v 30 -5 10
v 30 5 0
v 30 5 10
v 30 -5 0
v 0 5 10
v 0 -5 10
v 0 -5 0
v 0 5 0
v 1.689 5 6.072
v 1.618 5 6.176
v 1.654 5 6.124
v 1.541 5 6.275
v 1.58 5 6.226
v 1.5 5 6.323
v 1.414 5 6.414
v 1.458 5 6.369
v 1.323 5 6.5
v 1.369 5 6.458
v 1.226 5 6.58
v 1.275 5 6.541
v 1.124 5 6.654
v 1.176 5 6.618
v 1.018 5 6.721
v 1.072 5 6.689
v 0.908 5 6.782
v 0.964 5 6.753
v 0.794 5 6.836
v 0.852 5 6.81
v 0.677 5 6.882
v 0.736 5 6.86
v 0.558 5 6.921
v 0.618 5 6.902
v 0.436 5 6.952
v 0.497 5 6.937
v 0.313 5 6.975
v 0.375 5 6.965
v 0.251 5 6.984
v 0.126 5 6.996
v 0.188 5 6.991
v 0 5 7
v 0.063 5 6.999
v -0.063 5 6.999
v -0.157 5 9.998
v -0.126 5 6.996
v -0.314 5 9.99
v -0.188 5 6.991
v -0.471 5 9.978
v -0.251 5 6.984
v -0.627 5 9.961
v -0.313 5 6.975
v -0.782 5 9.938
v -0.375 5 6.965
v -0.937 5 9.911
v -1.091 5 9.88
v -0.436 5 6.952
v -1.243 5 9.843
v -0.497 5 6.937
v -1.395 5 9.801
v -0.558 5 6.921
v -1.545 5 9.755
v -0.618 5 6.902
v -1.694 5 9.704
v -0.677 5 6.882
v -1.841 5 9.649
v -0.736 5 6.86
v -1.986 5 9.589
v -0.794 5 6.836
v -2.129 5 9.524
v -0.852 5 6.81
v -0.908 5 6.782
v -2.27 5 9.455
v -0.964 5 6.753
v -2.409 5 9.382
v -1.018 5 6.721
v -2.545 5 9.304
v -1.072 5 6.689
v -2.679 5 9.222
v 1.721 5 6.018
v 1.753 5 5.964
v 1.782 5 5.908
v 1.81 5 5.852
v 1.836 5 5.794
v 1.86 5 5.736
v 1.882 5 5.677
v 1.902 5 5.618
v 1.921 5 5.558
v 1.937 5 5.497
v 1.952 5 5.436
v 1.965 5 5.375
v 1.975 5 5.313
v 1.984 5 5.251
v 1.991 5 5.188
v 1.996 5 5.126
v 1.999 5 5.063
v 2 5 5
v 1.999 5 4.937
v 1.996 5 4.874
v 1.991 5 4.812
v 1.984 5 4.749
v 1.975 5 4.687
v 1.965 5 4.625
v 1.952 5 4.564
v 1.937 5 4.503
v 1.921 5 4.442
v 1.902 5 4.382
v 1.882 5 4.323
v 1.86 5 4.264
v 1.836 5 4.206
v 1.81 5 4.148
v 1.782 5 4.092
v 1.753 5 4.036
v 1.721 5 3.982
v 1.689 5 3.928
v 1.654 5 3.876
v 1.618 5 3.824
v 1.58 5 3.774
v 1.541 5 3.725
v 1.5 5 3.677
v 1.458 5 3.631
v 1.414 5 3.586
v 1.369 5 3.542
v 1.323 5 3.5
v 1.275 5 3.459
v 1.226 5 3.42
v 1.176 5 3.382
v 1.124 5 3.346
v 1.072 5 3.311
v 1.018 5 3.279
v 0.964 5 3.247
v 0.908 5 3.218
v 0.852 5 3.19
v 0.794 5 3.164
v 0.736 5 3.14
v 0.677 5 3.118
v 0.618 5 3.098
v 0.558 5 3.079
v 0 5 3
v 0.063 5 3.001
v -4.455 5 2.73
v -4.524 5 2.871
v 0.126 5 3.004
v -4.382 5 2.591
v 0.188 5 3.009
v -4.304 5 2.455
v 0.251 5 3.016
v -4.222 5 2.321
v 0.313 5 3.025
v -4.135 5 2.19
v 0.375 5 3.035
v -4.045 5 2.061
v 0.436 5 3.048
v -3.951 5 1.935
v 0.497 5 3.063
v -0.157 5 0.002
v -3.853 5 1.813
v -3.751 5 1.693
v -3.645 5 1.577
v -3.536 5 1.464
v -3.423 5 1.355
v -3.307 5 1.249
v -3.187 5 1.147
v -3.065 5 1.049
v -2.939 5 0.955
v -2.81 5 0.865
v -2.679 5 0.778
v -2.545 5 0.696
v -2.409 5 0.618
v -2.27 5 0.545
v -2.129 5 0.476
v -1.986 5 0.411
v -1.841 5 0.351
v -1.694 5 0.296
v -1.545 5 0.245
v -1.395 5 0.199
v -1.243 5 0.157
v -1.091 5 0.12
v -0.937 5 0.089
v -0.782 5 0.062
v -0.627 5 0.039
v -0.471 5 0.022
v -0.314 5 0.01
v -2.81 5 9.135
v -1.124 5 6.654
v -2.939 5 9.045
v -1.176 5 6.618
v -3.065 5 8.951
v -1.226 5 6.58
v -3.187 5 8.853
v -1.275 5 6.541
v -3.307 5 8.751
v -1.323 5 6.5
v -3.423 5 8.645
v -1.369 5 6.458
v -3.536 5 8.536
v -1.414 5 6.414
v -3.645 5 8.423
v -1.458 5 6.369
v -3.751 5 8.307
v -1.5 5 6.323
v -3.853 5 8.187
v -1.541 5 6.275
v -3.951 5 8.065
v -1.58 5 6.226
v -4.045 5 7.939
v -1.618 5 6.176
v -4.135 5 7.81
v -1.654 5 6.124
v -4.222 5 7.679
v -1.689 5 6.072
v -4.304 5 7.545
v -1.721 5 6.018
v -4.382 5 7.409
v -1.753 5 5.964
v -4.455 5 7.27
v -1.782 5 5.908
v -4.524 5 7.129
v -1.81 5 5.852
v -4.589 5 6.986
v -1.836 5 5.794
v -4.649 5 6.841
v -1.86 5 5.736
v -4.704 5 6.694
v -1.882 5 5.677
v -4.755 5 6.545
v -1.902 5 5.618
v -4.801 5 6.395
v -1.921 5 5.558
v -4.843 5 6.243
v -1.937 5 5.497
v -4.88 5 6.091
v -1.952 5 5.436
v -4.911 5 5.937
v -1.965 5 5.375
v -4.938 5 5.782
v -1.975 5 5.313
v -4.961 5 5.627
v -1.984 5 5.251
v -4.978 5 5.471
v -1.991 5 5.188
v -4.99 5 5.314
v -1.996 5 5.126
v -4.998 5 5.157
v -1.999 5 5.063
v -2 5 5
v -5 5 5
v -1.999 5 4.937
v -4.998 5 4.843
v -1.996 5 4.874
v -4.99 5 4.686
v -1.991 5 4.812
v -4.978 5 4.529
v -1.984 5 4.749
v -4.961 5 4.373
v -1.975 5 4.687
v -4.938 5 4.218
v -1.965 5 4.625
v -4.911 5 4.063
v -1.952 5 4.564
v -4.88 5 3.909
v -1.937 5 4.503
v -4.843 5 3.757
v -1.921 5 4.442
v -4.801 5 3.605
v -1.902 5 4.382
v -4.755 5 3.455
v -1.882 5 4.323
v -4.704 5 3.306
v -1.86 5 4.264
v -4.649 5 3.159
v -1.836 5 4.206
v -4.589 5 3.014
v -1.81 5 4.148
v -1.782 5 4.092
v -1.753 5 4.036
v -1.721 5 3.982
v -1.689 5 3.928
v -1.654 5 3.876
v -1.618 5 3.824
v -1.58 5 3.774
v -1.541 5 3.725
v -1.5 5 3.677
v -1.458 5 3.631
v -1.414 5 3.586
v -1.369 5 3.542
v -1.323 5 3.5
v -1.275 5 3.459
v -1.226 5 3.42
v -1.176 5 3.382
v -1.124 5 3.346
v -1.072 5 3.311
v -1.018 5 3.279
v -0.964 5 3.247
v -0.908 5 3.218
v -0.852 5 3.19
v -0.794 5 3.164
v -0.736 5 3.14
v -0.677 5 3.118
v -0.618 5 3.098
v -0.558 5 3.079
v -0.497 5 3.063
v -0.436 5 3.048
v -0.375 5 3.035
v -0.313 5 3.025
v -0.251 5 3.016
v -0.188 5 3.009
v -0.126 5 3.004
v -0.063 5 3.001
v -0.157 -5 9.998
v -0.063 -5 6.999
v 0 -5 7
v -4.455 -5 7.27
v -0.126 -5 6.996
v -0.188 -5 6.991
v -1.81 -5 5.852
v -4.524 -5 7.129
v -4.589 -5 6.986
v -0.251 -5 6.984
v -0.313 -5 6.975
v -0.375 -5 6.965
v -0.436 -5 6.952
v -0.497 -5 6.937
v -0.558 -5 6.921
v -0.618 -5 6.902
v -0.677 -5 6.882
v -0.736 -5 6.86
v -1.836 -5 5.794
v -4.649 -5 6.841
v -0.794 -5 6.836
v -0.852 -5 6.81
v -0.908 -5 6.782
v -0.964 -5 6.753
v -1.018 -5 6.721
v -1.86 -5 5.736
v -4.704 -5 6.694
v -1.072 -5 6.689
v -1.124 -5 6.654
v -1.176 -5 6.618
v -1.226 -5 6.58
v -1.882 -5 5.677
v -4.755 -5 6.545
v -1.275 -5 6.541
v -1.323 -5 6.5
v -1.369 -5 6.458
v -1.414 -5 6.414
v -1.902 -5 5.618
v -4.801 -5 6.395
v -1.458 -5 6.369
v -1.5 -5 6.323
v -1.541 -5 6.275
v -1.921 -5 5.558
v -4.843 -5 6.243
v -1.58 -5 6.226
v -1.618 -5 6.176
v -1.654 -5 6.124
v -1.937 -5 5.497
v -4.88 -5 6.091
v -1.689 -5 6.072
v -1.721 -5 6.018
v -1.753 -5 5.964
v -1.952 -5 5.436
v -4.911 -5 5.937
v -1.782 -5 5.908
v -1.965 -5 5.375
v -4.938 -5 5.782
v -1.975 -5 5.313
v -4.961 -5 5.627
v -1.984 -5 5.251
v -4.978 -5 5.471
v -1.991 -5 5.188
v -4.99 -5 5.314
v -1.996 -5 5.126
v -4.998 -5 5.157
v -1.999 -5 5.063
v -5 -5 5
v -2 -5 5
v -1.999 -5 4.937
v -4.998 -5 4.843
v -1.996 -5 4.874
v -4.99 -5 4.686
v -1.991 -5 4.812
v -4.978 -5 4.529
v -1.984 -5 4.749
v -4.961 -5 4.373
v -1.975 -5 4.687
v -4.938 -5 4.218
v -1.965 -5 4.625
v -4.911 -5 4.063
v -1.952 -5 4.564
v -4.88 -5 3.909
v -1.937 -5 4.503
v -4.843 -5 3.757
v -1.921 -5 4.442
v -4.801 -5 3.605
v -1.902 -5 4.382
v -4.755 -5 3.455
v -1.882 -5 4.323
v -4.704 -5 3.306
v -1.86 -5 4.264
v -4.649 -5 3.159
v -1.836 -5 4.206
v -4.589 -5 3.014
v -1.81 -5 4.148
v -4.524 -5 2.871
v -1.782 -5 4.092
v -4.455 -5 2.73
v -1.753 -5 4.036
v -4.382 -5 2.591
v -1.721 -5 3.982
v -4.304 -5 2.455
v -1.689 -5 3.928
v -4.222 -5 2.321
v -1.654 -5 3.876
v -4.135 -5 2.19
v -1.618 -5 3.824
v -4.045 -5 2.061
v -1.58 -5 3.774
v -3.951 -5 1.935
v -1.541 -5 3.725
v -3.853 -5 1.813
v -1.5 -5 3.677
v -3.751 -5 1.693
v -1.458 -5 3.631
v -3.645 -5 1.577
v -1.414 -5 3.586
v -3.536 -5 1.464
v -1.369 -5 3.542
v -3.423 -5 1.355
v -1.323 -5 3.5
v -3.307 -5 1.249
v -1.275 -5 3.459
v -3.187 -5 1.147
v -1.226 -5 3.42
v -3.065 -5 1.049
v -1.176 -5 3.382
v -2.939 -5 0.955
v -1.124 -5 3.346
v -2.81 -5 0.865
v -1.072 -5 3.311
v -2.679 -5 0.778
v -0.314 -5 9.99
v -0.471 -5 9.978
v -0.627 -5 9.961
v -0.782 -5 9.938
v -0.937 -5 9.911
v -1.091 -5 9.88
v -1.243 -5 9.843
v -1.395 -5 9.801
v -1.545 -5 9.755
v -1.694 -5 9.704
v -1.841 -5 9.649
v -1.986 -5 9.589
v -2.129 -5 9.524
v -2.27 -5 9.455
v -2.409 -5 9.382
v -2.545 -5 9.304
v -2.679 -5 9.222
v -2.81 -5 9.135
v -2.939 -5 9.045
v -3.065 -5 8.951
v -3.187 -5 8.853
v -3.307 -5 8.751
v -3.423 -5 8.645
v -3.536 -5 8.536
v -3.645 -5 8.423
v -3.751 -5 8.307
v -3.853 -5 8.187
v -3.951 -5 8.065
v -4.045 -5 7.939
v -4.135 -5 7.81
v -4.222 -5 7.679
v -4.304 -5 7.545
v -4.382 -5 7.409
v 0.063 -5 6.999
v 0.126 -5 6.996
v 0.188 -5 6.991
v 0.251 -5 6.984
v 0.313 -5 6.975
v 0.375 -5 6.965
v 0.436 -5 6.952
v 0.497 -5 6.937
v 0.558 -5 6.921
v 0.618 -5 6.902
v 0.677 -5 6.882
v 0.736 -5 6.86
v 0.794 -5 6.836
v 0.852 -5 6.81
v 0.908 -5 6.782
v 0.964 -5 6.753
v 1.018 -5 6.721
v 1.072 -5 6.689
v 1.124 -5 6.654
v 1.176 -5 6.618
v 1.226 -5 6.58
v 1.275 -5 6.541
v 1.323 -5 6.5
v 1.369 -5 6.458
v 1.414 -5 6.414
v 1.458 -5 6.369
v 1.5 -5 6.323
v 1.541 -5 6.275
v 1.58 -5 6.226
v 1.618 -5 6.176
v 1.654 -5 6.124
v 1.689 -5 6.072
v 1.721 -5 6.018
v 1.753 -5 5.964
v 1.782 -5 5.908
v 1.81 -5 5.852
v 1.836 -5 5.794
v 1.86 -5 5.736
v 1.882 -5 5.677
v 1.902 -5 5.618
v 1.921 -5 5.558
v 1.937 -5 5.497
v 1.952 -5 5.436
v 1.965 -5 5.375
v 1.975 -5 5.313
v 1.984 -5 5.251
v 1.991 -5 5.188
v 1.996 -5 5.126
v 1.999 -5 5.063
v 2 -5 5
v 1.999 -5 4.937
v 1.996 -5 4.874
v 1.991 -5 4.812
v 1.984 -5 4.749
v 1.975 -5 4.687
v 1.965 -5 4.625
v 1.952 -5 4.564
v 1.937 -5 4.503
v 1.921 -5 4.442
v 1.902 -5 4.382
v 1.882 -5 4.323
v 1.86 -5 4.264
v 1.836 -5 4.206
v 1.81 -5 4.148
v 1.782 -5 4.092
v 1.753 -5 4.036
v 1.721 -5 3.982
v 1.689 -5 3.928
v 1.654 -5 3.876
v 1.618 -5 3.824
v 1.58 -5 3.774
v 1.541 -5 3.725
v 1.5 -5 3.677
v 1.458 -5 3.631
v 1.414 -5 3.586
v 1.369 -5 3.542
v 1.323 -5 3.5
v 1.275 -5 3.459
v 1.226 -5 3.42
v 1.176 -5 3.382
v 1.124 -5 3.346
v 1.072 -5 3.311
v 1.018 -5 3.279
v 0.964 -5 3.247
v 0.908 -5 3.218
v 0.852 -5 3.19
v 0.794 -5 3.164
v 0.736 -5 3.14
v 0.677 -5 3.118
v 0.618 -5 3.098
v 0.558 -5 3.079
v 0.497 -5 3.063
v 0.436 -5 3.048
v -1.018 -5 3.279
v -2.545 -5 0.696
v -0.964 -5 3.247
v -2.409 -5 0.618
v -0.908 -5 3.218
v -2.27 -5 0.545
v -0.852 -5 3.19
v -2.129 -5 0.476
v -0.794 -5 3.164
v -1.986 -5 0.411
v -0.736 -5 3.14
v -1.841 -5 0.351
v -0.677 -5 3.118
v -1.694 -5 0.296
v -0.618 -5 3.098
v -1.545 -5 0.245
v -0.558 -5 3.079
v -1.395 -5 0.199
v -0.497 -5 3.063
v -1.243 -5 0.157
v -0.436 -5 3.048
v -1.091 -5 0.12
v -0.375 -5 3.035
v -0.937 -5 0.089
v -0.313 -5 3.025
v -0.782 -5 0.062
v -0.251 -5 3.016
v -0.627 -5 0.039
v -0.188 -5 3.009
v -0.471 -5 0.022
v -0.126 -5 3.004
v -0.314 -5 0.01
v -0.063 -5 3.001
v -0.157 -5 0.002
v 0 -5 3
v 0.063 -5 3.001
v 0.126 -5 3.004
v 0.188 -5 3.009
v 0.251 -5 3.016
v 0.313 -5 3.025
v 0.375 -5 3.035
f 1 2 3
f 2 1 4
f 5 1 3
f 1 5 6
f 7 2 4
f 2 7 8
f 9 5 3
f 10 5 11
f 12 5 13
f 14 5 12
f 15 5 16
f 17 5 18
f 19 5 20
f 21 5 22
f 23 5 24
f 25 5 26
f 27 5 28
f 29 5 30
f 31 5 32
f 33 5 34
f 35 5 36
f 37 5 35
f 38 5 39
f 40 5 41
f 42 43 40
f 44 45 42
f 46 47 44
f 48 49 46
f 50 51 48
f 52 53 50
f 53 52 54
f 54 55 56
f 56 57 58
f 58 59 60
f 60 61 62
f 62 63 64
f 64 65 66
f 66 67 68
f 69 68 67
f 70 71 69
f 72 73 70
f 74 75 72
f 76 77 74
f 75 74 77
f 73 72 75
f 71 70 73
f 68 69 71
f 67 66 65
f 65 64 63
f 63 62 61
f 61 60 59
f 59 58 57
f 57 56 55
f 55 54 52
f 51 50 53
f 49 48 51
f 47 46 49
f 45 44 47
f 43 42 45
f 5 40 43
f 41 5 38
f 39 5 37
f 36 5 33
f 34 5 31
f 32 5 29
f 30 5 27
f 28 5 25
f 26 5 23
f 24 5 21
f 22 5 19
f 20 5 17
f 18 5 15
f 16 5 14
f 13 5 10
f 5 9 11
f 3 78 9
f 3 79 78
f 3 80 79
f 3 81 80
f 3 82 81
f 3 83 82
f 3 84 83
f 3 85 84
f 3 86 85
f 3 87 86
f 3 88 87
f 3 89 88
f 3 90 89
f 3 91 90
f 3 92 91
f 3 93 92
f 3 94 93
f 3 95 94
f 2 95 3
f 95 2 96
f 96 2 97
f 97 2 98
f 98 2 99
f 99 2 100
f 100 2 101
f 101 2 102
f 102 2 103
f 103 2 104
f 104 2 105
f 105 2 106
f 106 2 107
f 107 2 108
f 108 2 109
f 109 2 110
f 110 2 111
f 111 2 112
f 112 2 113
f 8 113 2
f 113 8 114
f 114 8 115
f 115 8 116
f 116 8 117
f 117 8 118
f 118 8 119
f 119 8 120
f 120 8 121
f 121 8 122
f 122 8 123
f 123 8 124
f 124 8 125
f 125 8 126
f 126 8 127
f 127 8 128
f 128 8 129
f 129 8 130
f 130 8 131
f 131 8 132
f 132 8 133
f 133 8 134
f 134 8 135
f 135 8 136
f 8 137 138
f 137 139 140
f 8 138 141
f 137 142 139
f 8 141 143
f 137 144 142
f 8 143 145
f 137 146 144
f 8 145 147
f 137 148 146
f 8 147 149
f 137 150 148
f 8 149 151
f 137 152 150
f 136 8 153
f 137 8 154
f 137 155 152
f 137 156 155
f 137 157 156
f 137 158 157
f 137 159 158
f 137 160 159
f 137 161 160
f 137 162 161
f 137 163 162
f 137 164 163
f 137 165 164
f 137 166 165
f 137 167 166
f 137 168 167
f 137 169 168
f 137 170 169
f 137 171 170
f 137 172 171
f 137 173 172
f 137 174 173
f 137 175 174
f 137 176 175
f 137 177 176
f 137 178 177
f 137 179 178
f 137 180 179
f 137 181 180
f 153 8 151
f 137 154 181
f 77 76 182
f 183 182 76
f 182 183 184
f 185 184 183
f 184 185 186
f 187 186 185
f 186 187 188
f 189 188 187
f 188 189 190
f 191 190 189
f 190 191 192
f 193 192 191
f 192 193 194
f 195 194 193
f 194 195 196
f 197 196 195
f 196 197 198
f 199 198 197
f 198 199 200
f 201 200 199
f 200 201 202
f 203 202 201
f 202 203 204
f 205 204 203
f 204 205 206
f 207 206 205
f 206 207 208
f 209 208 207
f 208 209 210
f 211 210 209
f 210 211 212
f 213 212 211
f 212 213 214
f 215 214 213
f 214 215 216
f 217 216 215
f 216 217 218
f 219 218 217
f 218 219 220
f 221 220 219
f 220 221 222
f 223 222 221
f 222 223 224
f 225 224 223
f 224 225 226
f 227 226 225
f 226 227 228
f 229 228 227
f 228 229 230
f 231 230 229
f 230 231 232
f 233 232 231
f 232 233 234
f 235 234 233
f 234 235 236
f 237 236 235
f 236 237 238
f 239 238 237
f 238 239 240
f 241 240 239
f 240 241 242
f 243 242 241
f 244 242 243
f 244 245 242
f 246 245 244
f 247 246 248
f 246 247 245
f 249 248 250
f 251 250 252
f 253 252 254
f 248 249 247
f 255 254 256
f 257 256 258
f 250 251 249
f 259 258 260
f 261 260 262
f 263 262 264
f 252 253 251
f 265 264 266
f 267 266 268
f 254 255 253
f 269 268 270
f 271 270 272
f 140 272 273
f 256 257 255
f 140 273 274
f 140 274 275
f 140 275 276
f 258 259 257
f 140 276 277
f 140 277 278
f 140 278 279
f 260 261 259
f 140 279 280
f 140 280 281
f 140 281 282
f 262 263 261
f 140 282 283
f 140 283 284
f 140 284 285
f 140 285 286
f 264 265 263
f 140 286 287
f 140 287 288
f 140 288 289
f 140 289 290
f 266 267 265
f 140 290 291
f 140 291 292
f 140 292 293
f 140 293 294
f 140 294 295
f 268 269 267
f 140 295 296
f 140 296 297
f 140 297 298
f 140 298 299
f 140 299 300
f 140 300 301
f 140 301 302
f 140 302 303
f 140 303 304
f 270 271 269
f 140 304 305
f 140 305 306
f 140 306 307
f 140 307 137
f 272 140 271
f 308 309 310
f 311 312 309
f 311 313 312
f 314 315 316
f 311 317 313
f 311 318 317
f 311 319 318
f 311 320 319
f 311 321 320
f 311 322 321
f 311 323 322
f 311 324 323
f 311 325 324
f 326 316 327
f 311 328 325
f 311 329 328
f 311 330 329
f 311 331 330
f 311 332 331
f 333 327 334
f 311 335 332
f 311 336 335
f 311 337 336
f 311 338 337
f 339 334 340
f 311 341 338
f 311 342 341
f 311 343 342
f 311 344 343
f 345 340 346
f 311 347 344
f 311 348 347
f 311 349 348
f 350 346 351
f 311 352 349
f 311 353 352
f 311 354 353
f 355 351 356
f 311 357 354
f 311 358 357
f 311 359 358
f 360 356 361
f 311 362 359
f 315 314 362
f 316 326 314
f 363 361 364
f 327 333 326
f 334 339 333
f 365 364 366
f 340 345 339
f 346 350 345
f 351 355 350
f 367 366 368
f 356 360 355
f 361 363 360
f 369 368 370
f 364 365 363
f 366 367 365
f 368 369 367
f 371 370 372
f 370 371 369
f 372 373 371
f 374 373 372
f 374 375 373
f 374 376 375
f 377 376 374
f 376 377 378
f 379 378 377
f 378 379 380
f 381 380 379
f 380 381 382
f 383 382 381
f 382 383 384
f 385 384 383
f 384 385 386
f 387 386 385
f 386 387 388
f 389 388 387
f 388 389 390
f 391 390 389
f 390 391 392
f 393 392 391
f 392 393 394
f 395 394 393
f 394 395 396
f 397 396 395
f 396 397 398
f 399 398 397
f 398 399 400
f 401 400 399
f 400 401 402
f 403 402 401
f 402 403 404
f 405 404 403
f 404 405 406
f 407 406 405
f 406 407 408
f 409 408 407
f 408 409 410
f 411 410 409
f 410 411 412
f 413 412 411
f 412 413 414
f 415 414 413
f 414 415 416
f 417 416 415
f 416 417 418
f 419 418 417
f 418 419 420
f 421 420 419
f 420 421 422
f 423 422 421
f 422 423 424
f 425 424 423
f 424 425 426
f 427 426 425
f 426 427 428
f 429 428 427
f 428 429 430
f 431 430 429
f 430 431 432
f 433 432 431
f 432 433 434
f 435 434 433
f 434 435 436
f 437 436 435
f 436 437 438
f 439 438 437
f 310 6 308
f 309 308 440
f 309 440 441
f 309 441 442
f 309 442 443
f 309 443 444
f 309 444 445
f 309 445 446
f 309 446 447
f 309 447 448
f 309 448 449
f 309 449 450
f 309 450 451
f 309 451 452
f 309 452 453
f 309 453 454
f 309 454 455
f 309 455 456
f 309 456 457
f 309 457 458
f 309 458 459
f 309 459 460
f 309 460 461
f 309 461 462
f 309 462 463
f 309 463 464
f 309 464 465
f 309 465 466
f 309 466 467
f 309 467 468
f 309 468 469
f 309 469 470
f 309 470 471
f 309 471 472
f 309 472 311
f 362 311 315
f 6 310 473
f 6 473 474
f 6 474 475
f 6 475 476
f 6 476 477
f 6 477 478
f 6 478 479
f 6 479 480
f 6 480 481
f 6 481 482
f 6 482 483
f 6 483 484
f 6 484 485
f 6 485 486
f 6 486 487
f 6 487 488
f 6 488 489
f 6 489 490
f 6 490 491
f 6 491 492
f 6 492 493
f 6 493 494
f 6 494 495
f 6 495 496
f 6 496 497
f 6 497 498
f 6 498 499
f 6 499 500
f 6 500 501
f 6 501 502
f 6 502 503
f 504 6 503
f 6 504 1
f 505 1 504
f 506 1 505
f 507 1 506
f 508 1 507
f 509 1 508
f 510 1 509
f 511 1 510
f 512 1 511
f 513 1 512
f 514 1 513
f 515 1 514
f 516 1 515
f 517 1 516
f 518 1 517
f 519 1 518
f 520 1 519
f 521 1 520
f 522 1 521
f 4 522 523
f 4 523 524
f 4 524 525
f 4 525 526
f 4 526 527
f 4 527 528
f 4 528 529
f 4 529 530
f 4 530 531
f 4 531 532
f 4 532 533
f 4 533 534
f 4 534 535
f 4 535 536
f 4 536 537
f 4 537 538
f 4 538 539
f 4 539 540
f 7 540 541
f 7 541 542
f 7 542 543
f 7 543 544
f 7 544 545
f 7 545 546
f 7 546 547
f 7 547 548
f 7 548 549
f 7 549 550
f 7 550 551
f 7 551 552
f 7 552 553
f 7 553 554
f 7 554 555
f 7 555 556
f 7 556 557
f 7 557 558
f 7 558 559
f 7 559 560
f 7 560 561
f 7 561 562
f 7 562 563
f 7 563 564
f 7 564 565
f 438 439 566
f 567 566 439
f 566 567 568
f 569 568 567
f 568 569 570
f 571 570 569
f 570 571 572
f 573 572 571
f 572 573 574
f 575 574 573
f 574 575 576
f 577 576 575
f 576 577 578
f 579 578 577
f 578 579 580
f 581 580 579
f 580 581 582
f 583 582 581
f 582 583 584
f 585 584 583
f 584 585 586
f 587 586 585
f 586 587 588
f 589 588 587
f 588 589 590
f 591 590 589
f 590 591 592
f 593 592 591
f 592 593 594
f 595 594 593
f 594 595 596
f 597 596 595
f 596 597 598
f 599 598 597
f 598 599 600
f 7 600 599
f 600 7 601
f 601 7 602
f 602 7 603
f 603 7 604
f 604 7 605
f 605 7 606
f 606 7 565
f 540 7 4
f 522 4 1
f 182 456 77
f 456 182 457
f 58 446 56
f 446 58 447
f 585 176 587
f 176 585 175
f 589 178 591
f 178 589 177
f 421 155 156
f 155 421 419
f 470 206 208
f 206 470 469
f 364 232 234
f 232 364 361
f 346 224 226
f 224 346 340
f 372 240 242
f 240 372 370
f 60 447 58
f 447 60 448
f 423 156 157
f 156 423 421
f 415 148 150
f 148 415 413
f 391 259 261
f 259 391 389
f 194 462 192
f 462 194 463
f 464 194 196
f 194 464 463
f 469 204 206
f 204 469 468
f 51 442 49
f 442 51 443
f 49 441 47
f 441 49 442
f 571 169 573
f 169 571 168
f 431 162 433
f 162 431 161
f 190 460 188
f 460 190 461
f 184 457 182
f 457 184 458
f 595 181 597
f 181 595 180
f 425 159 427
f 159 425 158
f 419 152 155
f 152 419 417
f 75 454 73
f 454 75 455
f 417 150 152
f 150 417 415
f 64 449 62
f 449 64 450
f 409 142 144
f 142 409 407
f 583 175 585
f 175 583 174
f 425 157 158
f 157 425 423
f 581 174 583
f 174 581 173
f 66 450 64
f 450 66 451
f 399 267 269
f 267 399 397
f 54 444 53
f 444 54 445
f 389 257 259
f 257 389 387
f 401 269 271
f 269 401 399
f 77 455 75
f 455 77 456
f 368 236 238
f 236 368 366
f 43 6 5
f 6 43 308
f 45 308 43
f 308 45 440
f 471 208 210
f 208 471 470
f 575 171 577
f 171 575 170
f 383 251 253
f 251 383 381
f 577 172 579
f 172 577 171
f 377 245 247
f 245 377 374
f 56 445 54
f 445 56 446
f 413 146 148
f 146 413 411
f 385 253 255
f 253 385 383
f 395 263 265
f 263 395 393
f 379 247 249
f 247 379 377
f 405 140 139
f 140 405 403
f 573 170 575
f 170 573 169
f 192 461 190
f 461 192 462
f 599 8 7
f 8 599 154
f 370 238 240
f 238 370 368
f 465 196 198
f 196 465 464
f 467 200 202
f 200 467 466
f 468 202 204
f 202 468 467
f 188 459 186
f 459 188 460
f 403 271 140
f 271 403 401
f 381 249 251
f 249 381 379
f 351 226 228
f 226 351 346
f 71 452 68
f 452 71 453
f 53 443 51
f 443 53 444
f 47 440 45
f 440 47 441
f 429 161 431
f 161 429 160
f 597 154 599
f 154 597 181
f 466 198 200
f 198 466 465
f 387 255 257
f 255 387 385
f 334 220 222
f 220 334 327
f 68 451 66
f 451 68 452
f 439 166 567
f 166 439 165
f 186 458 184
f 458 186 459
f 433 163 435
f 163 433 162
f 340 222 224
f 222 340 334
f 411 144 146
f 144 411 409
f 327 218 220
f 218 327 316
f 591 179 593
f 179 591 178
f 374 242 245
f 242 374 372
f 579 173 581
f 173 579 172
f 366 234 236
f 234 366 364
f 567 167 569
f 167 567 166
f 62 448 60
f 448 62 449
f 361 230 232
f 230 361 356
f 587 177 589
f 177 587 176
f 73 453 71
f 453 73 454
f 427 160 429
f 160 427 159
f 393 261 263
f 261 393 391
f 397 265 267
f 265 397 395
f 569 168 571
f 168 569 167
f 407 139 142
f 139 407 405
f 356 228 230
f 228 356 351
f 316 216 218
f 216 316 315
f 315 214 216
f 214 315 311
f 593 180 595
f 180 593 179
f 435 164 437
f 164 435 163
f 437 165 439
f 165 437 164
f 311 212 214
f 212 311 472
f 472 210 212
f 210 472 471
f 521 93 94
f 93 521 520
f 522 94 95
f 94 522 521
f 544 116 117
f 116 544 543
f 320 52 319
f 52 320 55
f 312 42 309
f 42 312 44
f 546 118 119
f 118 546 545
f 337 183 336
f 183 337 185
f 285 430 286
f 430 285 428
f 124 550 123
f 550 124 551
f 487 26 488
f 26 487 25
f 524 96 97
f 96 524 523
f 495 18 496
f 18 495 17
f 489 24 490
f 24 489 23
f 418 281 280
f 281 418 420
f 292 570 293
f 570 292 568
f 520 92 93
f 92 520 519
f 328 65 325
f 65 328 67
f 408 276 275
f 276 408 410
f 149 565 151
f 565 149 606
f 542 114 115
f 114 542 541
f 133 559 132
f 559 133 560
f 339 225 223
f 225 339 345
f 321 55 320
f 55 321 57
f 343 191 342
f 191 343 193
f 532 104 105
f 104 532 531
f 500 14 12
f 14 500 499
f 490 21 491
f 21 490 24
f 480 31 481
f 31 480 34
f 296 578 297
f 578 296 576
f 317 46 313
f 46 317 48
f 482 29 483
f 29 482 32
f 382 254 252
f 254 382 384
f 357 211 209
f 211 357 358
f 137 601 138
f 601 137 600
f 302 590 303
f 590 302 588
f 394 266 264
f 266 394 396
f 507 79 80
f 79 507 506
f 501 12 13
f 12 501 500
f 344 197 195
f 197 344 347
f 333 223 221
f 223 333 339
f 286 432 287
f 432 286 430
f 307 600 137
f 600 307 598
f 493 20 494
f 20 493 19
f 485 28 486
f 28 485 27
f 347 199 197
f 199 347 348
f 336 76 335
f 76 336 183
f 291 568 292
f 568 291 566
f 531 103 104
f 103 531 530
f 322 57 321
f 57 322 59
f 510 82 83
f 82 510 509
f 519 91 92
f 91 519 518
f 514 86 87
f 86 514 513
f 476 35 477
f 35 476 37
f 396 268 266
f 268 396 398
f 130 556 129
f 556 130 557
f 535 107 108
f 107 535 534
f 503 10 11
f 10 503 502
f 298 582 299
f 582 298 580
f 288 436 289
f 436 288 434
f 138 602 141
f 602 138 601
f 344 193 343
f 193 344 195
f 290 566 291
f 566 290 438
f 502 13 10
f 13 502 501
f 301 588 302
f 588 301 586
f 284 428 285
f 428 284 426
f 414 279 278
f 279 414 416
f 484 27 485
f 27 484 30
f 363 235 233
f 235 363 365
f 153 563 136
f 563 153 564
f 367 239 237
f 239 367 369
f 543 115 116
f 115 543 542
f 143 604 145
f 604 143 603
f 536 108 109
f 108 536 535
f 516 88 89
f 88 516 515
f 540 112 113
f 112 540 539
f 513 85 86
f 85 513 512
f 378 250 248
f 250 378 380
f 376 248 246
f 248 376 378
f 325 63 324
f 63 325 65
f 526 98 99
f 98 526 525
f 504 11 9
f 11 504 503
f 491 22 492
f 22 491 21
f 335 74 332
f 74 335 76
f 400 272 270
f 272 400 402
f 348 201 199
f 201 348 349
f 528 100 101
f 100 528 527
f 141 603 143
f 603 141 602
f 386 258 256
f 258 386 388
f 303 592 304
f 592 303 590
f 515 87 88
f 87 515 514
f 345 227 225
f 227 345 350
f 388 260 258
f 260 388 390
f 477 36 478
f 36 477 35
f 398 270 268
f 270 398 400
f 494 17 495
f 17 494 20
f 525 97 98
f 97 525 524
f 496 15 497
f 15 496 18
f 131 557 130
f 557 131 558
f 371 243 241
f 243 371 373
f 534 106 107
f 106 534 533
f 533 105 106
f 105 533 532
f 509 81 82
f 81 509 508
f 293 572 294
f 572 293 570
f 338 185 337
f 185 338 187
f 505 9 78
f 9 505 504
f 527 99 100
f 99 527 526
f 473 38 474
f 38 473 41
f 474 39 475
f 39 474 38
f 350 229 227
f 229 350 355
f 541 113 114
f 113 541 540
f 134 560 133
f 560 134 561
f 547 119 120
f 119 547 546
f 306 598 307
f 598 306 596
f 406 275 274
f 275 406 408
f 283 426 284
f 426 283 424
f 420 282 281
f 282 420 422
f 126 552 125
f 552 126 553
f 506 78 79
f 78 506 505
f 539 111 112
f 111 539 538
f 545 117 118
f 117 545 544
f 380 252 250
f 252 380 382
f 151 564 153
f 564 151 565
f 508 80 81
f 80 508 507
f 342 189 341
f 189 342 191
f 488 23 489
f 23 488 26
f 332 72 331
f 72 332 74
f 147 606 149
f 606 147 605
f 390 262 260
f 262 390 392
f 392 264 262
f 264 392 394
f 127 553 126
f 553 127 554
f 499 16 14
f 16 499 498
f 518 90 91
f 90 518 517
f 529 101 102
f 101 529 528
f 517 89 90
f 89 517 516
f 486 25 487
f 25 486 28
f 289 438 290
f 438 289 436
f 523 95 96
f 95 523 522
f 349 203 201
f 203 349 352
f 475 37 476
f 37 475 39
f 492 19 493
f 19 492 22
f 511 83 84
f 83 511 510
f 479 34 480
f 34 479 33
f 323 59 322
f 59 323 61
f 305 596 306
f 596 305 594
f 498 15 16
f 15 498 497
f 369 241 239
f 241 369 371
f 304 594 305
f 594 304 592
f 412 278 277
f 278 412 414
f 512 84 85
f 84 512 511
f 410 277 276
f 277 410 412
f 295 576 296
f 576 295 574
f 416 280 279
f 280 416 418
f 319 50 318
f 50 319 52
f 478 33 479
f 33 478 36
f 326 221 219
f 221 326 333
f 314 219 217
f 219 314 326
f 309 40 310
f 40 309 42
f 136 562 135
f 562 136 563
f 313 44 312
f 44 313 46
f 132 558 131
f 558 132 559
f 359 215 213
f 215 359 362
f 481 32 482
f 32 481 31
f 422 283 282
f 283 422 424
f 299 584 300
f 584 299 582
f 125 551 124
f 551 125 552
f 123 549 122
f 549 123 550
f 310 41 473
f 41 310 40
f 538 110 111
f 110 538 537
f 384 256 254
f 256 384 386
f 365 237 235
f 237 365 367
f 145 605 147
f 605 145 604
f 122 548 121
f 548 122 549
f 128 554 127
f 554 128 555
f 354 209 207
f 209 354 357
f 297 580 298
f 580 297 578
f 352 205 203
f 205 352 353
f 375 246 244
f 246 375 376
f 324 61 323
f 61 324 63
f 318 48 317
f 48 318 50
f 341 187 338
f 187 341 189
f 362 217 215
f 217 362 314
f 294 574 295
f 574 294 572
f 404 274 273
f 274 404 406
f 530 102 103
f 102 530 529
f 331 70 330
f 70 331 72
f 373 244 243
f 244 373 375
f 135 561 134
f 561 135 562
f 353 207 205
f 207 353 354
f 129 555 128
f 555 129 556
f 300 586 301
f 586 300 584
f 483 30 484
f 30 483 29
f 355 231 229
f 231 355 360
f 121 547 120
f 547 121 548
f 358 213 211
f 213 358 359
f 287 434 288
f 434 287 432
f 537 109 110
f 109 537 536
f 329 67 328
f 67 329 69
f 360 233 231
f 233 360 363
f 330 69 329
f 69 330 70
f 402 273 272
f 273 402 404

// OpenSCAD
//armlength is from the centre of the hole to the end of the flat end
module roundedArm(armWidth,armHeight,armLength,holeRadius){

difference(){
union(){
			translate([0,-armWidth/2,0]) cube([armLength,armWidth,armHeight]);

			
				translate([0,armWidth/2,armHeight/2]) rotate([90,0,0]) cylinder(r=armHeight/2, h= armWidth, $fn = 200);
			}


if(holeRadius > 0){
	translate([0,armWidth/2+1,armHeight/2]) rotate([90,0,0]) cylinder(r=holeRadius, h= armWidth+2, $fn = 200);
}		

}

}

roundedArm(10,10,30,2);
